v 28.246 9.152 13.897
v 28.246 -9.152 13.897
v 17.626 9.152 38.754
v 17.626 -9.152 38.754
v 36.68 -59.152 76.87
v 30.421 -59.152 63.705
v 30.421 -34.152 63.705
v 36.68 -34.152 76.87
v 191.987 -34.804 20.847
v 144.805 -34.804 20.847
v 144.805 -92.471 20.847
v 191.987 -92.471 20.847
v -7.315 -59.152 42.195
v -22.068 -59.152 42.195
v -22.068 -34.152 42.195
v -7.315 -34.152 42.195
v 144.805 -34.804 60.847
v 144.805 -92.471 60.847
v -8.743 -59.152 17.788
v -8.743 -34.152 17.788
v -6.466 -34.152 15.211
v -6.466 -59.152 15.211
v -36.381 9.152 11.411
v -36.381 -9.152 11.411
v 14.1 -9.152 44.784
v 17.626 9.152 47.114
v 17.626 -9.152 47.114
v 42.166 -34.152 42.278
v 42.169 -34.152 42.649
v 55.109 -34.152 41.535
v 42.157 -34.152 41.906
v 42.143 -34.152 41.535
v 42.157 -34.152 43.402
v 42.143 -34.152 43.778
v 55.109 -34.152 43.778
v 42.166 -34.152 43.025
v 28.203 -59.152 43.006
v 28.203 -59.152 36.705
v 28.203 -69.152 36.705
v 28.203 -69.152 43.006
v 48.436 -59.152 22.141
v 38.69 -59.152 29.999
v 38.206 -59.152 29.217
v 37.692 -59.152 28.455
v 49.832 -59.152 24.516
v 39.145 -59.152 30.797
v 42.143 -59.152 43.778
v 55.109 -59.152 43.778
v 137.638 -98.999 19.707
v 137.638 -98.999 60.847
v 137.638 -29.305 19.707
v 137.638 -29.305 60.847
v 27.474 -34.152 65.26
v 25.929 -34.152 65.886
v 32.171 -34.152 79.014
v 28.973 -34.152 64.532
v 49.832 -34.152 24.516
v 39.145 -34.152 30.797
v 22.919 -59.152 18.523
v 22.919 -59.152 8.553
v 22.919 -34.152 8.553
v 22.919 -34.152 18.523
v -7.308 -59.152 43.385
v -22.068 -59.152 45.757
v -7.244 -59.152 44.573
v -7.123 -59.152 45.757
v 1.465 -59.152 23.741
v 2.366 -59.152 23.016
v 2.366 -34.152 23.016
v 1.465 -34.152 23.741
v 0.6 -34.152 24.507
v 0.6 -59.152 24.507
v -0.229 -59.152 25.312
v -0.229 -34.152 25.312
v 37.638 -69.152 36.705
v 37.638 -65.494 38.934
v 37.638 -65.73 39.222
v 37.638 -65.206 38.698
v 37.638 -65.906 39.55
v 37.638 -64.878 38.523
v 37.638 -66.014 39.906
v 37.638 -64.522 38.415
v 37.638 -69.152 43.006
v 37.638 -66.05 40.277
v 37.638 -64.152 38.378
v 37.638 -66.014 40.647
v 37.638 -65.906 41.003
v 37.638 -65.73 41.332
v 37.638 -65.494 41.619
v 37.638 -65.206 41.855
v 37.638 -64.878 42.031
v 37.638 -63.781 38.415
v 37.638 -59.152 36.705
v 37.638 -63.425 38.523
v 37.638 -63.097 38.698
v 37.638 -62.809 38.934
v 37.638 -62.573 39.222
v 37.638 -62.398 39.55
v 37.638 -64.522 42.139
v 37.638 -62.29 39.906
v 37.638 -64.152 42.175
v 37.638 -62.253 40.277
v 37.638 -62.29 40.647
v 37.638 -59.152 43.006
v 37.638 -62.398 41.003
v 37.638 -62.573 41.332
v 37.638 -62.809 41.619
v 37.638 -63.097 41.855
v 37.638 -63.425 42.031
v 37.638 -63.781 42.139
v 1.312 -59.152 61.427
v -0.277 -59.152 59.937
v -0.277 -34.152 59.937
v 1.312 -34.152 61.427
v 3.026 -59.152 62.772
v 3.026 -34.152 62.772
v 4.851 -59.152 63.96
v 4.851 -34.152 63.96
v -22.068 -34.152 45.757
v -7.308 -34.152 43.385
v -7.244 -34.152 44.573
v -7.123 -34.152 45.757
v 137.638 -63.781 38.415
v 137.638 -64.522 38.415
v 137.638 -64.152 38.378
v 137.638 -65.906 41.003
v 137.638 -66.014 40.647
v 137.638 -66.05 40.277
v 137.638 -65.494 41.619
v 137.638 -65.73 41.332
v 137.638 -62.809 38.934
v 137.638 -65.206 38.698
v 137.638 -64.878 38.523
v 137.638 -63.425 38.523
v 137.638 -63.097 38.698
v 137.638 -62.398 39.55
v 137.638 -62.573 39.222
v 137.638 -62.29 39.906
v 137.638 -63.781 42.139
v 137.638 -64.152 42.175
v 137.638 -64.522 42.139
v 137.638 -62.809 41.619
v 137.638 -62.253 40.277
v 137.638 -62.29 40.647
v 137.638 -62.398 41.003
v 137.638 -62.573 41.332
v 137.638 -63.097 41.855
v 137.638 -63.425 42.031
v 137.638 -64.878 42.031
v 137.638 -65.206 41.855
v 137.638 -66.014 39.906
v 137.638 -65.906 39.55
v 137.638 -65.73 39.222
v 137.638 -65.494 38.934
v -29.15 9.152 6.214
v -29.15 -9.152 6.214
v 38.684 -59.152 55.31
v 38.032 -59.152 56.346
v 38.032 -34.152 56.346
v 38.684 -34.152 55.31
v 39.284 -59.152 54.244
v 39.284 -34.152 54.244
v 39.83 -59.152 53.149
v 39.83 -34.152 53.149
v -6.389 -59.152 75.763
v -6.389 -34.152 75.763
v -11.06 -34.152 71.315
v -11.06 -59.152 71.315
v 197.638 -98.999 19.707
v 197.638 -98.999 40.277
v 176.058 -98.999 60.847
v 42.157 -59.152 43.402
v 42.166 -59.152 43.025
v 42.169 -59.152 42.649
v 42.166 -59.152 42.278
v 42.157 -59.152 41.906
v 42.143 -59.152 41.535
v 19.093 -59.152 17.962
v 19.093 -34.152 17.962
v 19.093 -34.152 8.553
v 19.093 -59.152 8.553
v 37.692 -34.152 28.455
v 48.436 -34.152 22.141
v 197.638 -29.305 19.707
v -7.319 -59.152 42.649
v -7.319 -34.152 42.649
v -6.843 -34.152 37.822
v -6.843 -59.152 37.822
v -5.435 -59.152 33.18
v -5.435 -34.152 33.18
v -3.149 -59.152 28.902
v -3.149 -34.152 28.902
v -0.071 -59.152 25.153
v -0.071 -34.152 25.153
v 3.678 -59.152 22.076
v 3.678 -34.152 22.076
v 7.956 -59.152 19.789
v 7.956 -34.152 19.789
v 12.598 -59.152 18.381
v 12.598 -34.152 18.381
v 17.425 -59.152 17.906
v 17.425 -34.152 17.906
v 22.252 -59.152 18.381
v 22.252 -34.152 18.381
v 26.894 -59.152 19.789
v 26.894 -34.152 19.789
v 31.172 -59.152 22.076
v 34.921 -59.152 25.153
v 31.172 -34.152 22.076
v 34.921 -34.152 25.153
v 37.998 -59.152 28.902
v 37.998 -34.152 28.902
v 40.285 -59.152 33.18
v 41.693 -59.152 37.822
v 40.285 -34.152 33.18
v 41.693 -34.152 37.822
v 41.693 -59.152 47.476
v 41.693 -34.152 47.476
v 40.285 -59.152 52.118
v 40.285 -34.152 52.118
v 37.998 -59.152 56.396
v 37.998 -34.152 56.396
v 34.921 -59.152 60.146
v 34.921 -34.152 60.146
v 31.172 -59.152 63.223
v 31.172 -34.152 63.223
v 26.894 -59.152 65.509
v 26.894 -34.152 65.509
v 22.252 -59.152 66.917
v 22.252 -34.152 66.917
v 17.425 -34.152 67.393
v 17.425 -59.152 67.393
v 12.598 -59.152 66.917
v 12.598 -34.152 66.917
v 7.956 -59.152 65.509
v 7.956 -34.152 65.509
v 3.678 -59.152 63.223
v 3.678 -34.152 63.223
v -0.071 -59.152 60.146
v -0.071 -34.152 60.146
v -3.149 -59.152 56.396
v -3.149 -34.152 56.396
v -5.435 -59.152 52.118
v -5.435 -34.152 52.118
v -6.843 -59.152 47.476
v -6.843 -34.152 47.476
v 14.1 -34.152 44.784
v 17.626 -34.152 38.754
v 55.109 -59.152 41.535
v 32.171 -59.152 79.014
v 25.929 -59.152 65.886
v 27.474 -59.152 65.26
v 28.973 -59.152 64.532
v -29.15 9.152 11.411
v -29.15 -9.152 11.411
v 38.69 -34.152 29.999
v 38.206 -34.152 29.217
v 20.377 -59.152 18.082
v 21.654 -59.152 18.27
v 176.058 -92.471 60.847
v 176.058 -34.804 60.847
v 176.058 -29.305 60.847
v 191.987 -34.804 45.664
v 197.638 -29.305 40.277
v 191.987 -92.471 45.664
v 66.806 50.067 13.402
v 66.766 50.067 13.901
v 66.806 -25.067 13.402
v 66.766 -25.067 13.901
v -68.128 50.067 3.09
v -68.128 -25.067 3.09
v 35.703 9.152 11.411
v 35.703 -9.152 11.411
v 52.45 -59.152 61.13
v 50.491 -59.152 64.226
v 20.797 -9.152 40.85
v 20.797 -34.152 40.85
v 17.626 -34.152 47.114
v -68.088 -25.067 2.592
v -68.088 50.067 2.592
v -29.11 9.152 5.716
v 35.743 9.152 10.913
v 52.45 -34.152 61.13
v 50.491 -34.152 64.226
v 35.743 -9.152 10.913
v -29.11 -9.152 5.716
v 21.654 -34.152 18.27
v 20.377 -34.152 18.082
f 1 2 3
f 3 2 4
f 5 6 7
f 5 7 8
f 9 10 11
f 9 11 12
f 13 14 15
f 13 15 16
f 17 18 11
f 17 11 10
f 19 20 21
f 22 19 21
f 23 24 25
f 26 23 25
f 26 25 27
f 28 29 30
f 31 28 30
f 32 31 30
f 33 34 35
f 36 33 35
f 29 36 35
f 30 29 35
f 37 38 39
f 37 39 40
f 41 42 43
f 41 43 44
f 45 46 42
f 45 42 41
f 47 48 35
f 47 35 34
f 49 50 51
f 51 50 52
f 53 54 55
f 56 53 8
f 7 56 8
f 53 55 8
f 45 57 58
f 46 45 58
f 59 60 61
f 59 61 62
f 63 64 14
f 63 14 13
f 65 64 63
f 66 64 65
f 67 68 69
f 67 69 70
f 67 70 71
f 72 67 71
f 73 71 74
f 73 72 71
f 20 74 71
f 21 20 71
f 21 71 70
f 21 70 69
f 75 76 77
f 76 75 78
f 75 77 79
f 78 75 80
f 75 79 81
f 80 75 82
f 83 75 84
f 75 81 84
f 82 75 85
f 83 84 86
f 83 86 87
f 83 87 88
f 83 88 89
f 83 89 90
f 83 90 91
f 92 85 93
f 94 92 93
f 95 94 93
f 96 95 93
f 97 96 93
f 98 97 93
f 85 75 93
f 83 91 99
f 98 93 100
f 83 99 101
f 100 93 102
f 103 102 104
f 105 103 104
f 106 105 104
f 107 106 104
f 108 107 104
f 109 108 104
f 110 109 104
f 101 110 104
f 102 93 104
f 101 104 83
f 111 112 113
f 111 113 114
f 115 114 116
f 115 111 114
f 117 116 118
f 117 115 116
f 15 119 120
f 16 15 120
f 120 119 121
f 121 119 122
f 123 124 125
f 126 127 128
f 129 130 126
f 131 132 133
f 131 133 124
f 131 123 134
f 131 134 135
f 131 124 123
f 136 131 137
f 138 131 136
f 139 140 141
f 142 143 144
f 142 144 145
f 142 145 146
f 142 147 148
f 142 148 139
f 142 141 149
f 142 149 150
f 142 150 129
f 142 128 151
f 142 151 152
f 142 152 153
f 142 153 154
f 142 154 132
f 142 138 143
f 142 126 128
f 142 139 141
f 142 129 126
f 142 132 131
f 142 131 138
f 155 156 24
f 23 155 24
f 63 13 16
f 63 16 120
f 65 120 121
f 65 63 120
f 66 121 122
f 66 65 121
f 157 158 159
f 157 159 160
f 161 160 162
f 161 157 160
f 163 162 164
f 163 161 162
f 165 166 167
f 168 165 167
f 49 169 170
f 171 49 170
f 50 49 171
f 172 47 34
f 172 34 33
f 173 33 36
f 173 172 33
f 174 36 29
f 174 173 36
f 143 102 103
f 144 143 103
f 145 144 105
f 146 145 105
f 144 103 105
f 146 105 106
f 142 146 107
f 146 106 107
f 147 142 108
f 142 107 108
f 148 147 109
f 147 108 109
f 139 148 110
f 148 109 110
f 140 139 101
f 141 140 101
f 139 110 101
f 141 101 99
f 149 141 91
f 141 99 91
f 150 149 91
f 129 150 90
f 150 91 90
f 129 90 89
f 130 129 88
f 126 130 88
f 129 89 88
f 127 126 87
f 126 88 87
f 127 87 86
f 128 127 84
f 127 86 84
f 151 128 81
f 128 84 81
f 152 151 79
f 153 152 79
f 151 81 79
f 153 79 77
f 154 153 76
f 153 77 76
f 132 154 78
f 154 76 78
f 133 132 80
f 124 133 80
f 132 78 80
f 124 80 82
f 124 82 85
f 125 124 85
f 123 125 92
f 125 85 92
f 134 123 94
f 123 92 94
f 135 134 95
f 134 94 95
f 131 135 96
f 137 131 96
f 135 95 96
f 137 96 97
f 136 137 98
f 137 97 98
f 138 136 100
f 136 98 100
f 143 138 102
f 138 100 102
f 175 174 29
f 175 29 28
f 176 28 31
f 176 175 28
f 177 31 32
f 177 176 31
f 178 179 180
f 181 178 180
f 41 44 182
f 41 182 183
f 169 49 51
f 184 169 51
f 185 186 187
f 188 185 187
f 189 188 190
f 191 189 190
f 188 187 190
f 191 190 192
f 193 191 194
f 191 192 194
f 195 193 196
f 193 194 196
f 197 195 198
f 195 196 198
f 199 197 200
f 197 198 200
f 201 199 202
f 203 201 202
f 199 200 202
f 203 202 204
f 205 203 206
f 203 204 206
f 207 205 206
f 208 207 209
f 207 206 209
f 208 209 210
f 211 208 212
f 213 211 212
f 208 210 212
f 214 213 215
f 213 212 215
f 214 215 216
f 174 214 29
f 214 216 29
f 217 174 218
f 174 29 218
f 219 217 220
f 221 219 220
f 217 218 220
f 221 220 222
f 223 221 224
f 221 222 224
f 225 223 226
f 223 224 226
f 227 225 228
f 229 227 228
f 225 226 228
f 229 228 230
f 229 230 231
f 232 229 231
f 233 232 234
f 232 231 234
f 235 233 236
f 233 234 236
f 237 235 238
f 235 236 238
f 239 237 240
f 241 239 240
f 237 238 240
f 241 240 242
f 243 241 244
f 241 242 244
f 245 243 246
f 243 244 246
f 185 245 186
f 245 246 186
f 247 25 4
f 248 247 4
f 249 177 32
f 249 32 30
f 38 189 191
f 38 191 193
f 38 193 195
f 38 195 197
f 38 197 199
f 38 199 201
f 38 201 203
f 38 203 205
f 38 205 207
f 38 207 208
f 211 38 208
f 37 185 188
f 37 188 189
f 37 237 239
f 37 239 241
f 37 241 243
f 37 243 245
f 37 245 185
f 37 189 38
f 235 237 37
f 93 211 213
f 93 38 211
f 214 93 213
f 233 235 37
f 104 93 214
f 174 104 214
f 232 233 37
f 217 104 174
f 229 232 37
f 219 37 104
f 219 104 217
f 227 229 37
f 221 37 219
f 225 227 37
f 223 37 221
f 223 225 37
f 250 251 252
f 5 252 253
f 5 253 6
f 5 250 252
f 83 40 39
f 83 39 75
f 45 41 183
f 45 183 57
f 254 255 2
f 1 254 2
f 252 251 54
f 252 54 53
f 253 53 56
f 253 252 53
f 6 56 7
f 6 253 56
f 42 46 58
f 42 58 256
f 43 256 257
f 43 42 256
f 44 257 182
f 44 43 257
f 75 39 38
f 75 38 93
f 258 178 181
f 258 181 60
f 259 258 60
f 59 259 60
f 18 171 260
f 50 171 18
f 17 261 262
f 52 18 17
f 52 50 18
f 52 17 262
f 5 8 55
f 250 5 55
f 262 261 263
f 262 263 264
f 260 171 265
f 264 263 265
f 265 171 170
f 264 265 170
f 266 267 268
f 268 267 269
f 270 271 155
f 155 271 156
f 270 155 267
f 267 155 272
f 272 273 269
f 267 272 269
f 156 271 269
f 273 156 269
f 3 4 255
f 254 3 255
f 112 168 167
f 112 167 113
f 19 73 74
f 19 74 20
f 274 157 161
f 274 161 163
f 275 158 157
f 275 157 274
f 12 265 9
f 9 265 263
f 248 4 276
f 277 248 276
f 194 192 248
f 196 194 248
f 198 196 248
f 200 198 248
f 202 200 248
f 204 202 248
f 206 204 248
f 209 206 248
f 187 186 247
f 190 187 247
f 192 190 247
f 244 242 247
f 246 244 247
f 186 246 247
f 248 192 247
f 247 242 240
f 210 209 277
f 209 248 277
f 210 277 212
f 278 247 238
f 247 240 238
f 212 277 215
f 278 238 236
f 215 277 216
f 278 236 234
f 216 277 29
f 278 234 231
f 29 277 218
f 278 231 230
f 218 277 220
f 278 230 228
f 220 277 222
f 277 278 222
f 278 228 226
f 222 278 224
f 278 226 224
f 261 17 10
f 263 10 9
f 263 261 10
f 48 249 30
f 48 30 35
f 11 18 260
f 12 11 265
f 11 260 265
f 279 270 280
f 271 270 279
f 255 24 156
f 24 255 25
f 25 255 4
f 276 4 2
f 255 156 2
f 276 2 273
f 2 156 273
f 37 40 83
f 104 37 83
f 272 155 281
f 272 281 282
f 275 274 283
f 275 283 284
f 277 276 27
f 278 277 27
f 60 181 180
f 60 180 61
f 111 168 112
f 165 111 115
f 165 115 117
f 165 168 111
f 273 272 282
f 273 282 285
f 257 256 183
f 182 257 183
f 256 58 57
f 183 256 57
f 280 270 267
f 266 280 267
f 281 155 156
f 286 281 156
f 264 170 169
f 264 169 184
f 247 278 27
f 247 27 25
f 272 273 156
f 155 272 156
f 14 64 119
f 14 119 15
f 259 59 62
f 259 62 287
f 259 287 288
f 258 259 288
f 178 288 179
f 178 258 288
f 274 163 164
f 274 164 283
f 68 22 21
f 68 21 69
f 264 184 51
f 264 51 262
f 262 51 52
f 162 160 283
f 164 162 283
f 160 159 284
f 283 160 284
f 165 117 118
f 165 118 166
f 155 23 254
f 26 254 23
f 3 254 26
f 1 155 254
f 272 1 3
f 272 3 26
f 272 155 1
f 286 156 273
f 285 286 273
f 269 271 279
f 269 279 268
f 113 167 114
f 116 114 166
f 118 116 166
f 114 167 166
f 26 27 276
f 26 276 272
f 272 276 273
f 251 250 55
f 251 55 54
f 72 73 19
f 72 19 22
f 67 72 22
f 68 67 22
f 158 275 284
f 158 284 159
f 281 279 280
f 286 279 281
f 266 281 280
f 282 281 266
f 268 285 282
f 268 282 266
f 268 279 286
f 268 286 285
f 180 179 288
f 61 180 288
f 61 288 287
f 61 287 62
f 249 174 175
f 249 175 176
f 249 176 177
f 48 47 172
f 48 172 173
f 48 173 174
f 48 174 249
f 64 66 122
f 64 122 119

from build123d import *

# Parameters (mm, degrees)
F0_W      = 79.9928382039
F0_H      = 18.303444609
F1_DEPTH  = 50
F2_W      = 79.9928382039
F2_H      = 50
F3_DEPTH  = 18.304444609
F5_DEPTH  = 25
F6_W      = 135.3265494108
F6_H      = 100.133895874
F6_W_2    = 65.060867267
F6_H_2    = 18.303444609
F7_DEPTH  = 0.5
F9_DEPTH  = 25
F11_DEPTH = 25
F13_DEPTH = 25
F14_W     = 9.435325861
F14_H     = 6.3013508916
F15_DEPTH = 10
F16_R     = 1.8985138223
F17_DEPTH = 100
F18_W     = 69.6939403564
F18_H     = 41.1395505071
F18_R     = 1.8985138223
F19_DEPTH = 60
F20_W     = 47.1818447113
F20_H     = 57.6667264104
F21_DEPTH = 40
F23_DEPTH = 149.0666404197


# Not quite as in the source:
# - a feature names something its author has since deleted; it is built from what else it names


with BuildPart() as f1:
    # F0 (on Top) → F1 (new body)
    with BuildSketch(Plane.XY):
        Rectangle(F0_W, F0_H)
    extrude(amount=F1_DEPTH)

    # F2 (on face) → F3 (cut, through all)
    with BuildSketch(Plane.XZ.offset(9.1517223045)):
        with Locations((0, 25)):
            Rectangle(F2_W, F2_H)
        Polygon((35.7030183077, 11.4114070311), (-29.1499290615, 6.2141320668), (-36.3809205592, 11.4114070311), (17.6255404949, 47.1144206822), align=None, mode=Mode.SUBTRACT)
        Polygon((17.6255404949, 38.7535877526), (-29.1499290615, 11.4114070311), (28.2460581511, 13.8970594853), align=None)
    extrude(amount=-F3_DEPTH, mode=Mode.SUBTRACT)

    # F4 (on face) → F5 (join)
    with BuildSketch(Plane.XZ.offset(9.1517223045)):
        Polygon((14.1004873602, 44.7840509869), (17.6255404949, 38.7535877526), (20.7972230716, 40.8503484757), (17.6255404949, 47.1144206822), align=None)
    extrude(amount=F5_DEPTH)

    # F8 (on face) → F9 (join)
    with BuildSketch(Plane.XZ.offset(34.1517223045)):
        Polygon((20.7972230716, 40.8503484757), (19.8864468458, 42.6491312683), (15.3484355118, 42.6491312683), (17.6255404949, 38.7535877526), align=None)
        Polygon((15.3484355118, 42.6491312683), (19.8864468458, 42.6491312683), (17.6255404949, 47.1144206822), (14.1004873602, 44.7840509869), align=None)
        with BuildLine():
            Line((19.8864468458, 42.6491312683), (42.1685310007, 42.6491312683))
            ThreePointArc((42.1685310007, 42.6491312683), (17.4249261618, 67.3927361072), (-7.3186786772, 42.6491312683))
            Line((-7.3186786772, 42.6491312683), (15.3484355118, 42.6491312683))
            Line((15.3484355118, 42.6491312683), (14.1004873602, 44.7840509869))
            Line((14.1004873602, 44.7840509869), (17.6255404949, 47.1144206822))
            Line((17.6255404949, 47.1144206822), (19.8864468458, 42.6491312683))
        make_face()
        with BuildLine():
            ThreePointArc((-7.3186786772, 42.6491312683), (17.4249261618, 17.9055264293), (42.1685310007, 42.6491312683))
            Line((42.1685310007, 42.6491312683), (19.8864468458, 42.6491312683))
            Line((19.8864468458, 42.6491312683), (20.7972230716, 40.8503484757))
            Line((20.7972230716, 40.8503484757), (17.6255404949, 38.7535877526))
            Line((17.6255404949, 38.7535877526), (15.3484355118, 42.6491312683))
            Line((15.3484355118, 42.6491312683), (-7.3186786772, 42.6491312683))
        make_face()
    extrude(amount=F9_DEPTH)

    # F14 (on face) → F15 (join)
    with BuildSketch(Plane.XZ.offset(59.1517223045)):
        with Locations((32.9205654562, 39.8556888103)):
            Rectangle(F14_W, F14_H)
    extrude(amount=F15_DEPTH)

    # F16 (on face) → F17 (join)
    with BuildSketch(Plane.YZ.offset(37.6382283866)):
        with Locations((-64.1517223045, 40.2767546475)):
            Circle(F16_R)
    extrude(amount=F17_DEPTH)


with BuildPart() as f7:
    # F6 (on face) → F7 (new body)
    with BuildSketch(Plane(origin=(-0.6808343292, 0, 8.4956276551), x_dir=(0.9968042249, 0, 0.0798832721), z_dir=(0.0798832721, 0, -0.9968042249))):
        Rectangle(F6_W, F6_H)
        with Locations((3.9700663915, 0)):
            Rectangle(F6_W_2, F6_H_2, mode=Mode.SUBTRACT)
    extrude(amount=F7_DEPTH)

    # F11 (cut): a face of the model
    f11_faces = [f7.faces().sort_by_distance(p)[0] for p in [
        (-0.6608635112, -50.066947937, 8.2464265988),
    ]]
    extrude(f11_faces, amount=-F11_DEPTH, mode=Mode.SUBTRACT)


with BuildPart() as f13:
    # F12 (on face) → F13 (new body)
    with BuildSketch(Plane.XZ.offset(59.1517223045)):
        with BuildLine():
            ThreePointArc((25.9287375384, 65.8855503662), (28.2297677146, 64.9089915428), (30.4205267746, 63.7052549651))
            Line((30.4205267746, 63.7052549651), (36.6799546023, 76.8704908801))
            Line((36.6799546023, 76.8704908801), (32.170843333, 79.0143534541))
            Line((32.170843333, 79.0143534541), (25.9287375384, 65.8855503662))
        make_face()
    extrude(amount=-F13_DEPTH)


with BuildPart() as f13b:
    # F12 (on face) → F13, piece 2 (new body)
    with BuildSketch(Plane.XZ.offset(59.1517223045)):
        with BuildLine():
            ThreePointArc((38.0318597301, 56.345856035), (38.9903960982, 54.7807629329), (39.8302887258, 53.1489269235))
            Line((39.8302887258, 53.1489269235), (52.4495742528, 61.130350821))
            Line((52.4495742528, 61.130350821), (50.491463393, 64.2262846231))
            Line((50.491463393, 64.2262846231), (38.0318597301, 56.345856035))
        make_face()
    extrude(amount=-F13_DEPTH)


with BuildPart() as f13c:
    # F12 (on face) → F13, piece 3 (new body)
    with BuildSketch(Plane.XZ.offset(59.1517223045)):
        with BuildLine():
            Line((49.8318262398, 24.5164651424), (39.1453309961, 30.7971274605))
            ThreePointArc((39.1453309961, 30.7971274605), (38.4514582478, 29.6057065315), (37.6923008836, 28.4547837204))
            Line((37.6923008836, 28.4547837203), (48.4355733395, 22.1407523238))
            Line((48.4355733395, 22.1407523238), (49.8318262398, 24.5164651424))
        make_face()
    extrude(amount=-F13_DEPTH)


with BuildPart() as f13d:
    # F12 (on face) → F13, piece 4 (new body)
    with BuildSketch(Plane.XZ.offset(59.1517223045)):
        with BuildLine():
            ThreePointArc((-7.3145034198, 42.1945936978), (-7.2829121383, 43.9790586964), (-7.122774146, 45.7566045225))
            Line((-7.122774146, 45.7566045225), (-22.0680162311, 45.7566045225))
            Line((-22.0680162311, 45.7566045225), (-22.0680162311, 42.1945936978))
            Line((-22.0680162311, 42.1945936978), (-7.3145034198, 42.1945936978))
        make_face()
    extrude(amount=-F13_DEPTH)


with BuildPart() as f13e:
    # F12 (on face) → F13, piece 5 (new body)
    with BuildSketch(Plane.XZ.offset(59.1517223045)):
        with BuildLine():
            Line((55.1088824868, 43.7777079642), (42.1427799332, 43.7777079642))
            ThreePointArc((42.1427799332, 43.7777079642), (42.1620923961, 43.2135664895), (42.1685310007, 42.6491312683))
            ThreePointArc((42.1685310007, 42.6491312683), (42.1622558216, 42.0919044519), (42.1434334673, 41.5349602699))
            Line((42.1434334673, 41.5349602699), (55.1088824868, 41.5349602699))
            Line((55.1088824868, 41.5349602699), (55.1088824868, 43.7777079642))
        make_face()
    extrude(amount=-F13_DEPTH)


with BuildPart() as f13f:
    # F12 (on face) → F13, piece 6 (new body)
    with BuildSketch(Plane.XZ.offset(59.1517223045)):
        with BuildLine():
            Line((22.9188613594, 8.5533810779), (22.9188613594, 18.5231565425))
            ThreePointArc((22.9188613594, 18.5231565425), (21.0169117184, 18.1676358036), (19.0929975361, 17.961816341))
            Line((19.0929975361, 17.961816341), (19.0929975361, 8.5533810779))
            Line((19.0929975361, 8.5533810779), (22.9188613594, 8.5533810779))
        make_face()
    extrude(amount=-F13_DEPTH)


with BuildPart() as f13g:
    # F12 (on face) → F13, piece 7 (new body)
    with BuildSketch(Plane.XZ.offset(59.1517223045)):
        with BuildLine():
            Line((-6.4659747203, 15.2110734288), (2.3657253742, 23.0158316968))
            ThreePointArc((2.3657253742, 23.0158316968), (1.0278812114, 24.1185377181), (-0.2294625715, 25.3122186573))
            Line((-0.2294625715, 25.3122186573), (-8.7434565648, 17.7882239223))
            Line((-8.7434565648, 17.7882239223), (-6.4659747203, 15.2110734288))
        make_face()
    extrude(amount=-F13_DEPTH)


with BuildPart() as f13h:
    # F12 (on face) → F13, piece 8 (new body)
    with BuildSketch(Plane.XZ.offset(59.1517223045)):
        with BuildLine():
            ThreePointArc((-0.2773562415, 59.9371380401), (2.1540120961, 62.1182135277), (4.8514824982, 63.9600321142))
            Line((4.8514824982, 63.9600321142), (-6.3894838095, 75.7631883025))
            Line((-6.3894838095, 75.7631883025), (-11.0599229864, 71.3152043402))
            Line((-11.0599229864, 71.3152043402), (-0.2773562415, 59.9371380401))
        make_face()
    extrude(amount=-F13_DEPTH)


with BuildPart() as f19:
    # F18 (on face) → F19 (new body)
    with BuildSketch(Plane.YZ.offset(137.6382283866)):
        with Locations((-64.1517223045, 40.2767546475)):
            Rectangle(F18_W, F18_H)
        with Locations((-64.1517223045, 40.2767546475)):
            Circle(F18_R, mode=Mode.SUBTRACT)
        with Locations((-64.1517223045, 40.2767546475)):
            Circle(F18_R)
    extrude(amount=F19_DEPTH)

    # F20 (on face) → F21 (cut)
    with BuildSketch(Plane.XY.offset(60.846529901)):
        with Locations((168.3957129717, -63.6372715235)):
            Rectangle(F20_W, F20_H)
    extrude(amount=-F21_DEPTH, mode=Mode.SUBTRACT)

    # F22 (on face) → F23 (cut, through all)
    with BuildSketch(Plane.XZ.offset(98.9986924827)):
        Polygon((197.6382283866, 60.846529901), (176.0575026274, 60.846529901), (197.6382283866, 40.2767546475), align=None)
    extrude(amount=-F23_DEPTH, mode=Mode.SUBTRACT)


solid = Compound([f1.part, f7.part, f13.part, f13b.part, f13c.part, f13d.part, f13e.part, f13f.part, f13g.part, f13h.part, f19.part])
